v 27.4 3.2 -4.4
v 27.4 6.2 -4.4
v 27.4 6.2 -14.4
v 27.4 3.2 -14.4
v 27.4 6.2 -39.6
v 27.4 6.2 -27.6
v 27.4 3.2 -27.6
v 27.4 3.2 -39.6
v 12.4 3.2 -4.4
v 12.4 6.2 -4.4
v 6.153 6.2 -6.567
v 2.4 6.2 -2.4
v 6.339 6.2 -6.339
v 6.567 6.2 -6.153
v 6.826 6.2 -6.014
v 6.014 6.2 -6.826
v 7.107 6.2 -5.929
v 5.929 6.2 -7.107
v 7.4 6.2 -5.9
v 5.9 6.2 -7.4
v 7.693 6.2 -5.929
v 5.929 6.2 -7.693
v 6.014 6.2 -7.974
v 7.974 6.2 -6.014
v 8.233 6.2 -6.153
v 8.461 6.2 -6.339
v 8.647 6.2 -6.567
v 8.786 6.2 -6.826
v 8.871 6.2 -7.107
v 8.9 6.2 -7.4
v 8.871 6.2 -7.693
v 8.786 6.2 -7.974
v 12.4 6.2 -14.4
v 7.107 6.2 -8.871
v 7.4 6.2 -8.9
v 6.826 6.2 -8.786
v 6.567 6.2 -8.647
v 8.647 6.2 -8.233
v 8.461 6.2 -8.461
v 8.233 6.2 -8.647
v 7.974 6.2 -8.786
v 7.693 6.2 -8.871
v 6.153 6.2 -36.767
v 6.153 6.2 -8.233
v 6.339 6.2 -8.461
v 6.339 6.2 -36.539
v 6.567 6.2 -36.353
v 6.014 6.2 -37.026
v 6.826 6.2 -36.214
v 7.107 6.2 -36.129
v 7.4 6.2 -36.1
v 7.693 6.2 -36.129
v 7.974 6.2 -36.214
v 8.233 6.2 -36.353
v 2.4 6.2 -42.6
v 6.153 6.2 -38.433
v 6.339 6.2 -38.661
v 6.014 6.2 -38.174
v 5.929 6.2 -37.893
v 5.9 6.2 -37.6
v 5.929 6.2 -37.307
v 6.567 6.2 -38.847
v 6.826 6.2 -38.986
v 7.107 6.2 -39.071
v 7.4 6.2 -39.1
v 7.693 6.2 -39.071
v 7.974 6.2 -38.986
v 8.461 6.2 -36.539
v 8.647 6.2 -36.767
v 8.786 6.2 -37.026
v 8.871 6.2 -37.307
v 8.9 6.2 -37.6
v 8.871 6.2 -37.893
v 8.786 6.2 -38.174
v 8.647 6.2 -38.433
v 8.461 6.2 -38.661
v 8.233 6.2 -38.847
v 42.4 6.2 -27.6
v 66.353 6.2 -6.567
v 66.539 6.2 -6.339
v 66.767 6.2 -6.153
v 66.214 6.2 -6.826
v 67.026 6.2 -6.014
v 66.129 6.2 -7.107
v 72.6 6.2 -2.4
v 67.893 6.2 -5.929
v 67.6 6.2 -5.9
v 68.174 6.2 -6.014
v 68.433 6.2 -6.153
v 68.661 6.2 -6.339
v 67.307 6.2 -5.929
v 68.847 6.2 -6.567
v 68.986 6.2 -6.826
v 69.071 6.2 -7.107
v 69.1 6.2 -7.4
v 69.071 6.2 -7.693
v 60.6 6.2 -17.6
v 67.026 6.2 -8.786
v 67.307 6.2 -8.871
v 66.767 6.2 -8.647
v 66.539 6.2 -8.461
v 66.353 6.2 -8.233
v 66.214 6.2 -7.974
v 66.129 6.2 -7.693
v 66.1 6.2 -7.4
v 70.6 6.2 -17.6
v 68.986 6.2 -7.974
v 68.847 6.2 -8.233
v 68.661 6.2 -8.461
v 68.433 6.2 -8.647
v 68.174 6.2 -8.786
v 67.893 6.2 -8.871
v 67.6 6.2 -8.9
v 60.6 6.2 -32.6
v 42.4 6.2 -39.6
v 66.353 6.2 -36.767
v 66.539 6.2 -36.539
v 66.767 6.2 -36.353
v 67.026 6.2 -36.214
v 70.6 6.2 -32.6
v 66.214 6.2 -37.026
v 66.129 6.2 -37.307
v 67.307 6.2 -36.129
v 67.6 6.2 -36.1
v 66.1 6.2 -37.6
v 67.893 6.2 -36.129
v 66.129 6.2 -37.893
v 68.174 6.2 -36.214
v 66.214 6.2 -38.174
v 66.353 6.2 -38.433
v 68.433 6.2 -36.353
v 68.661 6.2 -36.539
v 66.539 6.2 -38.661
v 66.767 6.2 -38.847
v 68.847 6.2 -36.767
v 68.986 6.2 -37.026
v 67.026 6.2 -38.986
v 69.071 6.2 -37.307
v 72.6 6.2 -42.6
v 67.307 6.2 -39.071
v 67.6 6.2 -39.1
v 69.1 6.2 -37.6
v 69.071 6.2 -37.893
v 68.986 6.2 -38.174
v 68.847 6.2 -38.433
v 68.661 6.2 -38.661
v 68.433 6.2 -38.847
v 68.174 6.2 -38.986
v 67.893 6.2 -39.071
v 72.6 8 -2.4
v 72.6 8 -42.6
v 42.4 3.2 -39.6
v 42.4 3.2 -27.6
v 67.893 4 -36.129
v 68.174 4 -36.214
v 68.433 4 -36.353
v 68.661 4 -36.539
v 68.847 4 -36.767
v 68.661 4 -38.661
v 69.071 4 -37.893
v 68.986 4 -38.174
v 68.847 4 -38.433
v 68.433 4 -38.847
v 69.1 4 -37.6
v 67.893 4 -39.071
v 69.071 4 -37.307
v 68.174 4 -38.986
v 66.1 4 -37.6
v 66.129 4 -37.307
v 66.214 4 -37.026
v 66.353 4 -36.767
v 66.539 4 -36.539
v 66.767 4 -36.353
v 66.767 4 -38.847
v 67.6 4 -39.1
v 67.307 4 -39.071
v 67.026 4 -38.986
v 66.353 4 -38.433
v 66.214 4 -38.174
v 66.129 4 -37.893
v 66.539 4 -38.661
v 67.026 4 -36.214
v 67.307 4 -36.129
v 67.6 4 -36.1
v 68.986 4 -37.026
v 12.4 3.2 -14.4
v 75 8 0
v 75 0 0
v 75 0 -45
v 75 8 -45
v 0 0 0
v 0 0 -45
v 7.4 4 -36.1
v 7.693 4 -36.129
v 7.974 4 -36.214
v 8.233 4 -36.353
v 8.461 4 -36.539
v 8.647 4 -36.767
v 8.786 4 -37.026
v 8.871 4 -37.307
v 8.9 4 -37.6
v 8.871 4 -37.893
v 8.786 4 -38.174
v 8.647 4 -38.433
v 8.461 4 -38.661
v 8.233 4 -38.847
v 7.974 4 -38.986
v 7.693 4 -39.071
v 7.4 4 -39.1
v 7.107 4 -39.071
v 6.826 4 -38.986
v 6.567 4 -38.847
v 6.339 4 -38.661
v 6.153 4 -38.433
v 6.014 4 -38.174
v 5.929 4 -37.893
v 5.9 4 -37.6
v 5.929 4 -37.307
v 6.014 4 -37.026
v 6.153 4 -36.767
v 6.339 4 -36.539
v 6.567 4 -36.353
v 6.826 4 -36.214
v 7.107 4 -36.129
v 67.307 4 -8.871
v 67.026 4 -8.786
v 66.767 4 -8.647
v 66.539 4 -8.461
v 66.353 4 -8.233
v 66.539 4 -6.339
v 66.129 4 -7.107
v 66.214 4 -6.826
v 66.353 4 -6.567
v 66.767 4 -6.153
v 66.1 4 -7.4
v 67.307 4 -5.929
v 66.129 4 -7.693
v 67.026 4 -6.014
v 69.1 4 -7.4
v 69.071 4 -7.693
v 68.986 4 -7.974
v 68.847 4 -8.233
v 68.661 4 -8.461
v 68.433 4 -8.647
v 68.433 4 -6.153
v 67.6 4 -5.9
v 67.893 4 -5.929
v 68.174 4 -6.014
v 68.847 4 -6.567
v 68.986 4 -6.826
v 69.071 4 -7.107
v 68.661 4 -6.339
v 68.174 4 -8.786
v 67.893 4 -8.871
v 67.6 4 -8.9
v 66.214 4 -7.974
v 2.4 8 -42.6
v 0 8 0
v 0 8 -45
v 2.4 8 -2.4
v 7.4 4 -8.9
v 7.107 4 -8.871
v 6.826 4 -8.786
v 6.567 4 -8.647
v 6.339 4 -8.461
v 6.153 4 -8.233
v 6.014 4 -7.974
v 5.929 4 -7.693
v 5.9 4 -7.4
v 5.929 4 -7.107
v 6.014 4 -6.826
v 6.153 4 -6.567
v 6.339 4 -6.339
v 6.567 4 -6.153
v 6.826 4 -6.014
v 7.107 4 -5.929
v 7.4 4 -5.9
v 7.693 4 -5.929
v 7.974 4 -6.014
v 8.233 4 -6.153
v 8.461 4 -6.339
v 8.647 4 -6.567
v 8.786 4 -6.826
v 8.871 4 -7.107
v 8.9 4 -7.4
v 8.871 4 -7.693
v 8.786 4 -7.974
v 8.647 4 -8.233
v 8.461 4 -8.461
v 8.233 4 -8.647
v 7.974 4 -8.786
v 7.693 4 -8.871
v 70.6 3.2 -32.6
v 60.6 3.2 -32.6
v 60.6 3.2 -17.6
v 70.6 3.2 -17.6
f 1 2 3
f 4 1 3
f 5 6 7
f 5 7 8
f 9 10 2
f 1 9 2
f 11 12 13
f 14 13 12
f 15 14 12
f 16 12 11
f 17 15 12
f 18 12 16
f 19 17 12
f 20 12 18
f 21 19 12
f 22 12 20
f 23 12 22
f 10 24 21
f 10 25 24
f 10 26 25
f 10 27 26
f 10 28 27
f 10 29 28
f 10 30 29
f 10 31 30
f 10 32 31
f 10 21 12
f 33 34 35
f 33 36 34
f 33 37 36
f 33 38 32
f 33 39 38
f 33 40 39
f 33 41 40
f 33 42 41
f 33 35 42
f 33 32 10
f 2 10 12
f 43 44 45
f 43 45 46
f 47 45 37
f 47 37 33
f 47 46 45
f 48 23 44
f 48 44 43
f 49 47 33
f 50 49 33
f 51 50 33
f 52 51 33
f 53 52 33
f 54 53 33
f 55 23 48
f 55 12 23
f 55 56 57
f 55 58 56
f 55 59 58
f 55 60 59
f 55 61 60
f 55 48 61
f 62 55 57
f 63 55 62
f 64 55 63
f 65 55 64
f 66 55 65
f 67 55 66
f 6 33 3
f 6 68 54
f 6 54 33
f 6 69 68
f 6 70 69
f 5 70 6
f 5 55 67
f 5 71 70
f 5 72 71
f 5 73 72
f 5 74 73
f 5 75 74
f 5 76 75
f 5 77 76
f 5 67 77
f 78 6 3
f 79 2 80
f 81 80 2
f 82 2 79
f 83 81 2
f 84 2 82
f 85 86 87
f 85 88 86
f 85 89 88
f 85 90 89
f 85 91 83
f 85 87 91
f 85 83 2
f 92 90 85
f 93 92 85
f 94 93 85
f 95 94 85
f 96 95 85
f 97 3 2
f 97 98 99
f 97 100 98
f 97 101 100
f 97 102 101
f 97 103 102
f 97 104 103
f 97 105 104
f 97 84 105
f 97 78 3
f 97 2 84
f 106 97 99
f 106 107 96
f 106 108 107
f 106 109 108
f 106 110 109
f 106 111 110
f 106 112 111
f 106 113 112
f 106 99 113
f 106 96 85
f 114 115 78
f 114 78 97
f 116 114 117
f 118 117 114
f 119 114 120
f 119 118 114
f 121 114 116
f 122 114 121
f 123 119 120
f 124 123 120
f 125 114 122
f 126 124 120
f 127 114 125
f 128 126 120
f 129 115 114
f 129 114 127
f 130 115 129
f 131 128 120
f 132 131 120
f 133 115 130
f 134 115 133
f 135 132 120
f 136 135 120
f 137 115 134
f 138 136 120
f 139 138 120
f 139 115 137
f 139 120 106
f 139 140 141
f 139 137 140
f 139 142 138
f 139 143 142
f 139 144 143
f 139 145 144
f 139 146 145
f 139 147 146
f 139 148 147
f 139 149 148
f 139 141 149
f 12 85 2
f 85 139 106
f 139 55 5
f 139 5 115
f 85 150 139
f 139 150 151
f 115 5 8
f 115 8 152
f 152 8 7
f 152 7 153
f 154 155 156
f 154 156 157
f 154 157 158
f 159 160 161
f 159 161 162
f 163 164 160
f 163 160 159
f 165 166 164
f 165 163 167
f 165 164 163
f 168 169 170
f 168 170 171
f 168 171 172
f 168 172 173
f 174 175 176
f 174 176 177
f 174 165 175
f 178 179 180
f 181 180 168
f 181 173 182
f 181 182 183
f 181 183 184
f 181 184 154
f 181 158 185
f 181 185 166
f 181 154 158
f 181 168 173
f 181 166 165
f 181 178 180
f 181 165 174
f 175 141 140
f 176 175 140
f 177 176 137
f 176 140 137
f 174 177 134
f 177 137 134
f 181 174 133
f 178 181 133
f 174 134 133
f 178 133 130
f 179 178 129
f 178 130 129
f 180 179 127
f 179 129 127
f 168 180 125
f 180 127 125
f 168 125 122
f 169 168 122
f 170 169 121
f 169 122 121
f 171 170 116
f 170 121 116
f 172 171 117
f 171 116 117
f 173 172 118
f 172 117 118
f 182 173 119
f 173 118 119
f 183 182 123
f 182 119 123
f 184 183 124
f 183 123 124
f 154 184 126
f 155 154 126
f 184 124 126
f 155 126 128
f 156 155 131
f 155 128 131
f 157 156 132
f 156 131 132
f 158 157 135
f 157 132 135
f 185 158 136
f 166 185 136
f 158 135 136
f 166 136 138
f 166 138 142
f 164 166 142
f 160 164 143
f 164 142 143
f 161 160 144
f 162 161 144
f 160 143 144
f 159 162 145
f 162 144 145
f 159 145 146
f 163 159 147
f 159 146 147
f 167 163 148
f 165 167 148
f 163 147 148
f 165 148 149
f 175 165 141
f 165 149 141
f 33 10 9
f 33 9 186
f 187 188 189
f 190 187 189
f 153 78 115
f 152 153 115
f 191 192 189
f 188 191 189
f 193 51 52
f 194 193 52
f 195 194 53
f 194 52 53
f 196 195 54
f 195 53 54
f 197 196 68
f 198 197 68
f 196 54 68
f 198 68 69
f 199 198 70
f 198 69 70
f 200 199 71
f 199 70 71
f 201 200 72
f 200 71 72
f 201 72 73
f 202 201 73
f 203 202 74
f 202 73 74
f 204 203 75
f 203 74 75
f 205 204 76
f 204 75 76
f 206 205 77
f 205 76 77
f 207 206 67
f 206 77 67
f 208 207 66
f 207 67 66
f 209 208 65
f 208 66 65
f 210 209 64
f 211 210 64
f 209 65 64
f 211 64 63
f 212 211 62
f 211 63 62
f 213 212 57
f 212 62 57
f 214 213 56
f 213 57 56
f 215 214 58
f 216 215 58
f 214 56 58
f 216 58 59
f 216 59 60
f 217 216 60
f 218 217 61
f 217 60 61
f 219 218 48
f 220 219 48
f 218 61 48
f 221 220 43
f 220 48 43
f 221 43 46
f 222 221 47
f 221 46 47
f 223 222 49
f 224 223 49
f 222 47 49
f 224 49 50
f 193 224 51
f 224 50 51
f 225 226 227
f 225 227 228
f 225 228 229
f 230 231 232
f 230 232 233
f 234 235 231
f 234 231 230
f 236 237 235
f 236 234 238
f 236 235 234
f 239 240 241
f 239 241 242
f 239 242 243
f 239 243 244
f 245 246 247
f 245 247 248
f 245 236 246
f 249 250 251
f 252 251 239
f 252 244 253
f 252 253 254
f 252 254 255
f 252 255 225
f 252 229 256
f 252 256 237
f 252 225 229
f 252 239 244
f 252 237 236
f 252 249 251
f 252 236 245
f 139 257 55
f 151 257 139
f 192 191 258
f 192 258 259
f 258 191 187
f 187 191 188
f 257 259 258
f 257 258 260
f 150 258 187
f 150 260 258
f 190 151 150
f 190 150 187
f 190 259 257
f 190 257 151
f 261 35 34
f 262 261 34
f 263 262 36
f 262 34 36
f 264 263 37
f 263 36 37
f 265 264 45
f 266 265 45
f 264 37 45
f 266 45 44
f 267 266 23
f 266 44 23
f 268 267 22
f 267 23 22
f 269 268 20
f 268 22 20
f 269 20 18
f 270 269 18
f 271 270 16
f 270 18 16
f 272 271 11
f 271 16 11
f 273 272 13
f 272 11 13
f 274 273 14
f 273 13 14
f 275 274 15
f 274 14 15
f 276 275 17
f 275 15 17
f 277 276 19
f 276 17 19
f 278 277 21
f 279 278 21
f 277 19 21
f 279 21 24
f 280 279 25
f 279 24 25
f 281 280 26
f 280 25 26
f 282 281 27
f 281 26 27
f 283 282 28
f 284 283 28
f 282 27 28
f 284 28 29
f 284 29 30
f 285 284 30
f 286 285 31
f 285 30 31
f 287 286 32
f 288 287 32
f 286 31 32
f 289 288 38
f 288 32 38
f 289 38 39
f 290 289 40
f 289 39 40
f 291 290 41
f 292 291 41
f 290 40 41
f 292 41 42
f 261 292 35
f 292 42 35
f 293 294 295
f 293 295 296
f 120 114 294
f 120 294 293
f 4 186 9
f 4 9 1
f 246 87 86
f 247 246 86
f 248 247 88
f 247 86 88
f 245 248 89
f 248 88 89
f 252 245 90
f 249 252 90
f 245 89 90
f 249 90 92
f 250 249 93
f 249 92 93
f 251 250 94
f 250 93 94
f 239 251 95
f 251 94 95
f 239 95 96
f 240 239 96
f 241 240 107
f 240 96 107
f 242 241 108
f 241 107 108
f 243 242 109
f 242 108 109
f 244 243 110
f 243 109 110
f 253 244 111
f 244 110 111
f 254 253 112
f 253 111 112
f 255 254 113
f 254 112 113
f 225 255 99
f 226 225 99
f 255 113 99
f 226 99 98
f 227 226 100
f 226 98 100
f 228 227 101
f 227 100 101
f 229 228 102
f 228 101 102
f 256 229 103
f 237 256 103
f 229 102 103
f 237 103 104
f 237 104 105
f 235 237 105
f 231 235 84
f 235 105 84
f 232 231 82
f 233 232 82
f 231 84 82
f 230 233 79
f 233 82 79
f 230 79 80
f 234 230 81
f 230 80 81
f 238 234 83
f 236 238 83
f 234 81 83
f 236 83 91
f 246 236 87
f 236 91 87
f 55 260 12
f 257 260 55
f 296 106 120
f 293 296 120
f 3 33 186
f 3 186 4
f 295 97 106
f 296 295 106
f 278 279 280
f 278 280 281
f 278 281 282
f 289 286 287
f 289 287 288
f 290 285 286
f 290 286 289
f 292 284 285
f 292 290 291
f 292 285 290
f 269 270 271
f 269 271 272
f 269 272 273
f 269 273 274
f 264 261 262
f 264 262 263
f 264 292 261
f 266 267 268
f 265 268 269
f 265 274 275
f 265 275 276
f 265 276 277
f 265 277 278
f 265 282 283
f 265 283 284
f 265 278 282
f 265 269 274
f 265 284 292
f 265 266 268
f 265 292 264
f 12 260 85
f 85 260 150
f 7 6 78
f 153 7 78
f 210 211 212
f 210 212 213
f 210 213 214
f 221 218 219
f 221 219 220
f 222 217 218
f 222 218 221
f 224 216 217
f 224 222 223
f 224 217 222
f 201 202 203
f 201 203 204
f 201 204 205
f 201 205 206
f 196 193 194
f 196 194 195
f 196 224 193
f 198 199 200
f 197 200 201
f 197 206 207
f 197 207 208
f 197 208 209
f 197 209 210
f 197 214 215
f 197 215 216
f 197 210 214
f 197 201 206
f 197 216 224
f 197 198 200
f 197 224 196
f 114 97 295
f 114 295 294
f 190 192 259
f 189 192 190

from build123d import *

# Parameters (mm, degrees)
SKETCH_2_W          = 75
SKETCH_2_H          = 45
EXTRUDE_3_DEPTH     = 8
SKETCH_5_W          = 70.2
SKETCH_5_H          = 40.2
CUT_EXTRUDE_1_DEPTH = 1.8
SKETCH_7_R          = 1.5
CUT_EXTRUDE_4_DEPTH = 2.2
SKETCH_8_W          = 15
SKETCH_8_H          = 10
SKETCH_8_W_2        = 10
SKETCH_8_H_2        = 15
SKETCH_8_H_3        = 12
CUT_EXTRUDE_6_DEPTH = 3


with BuildPart() as part:
    # 草图2 → 凸台-拉伸3 (new body)
    with BuildSketch(Plane(origin=(0, 0, 0), x_dir=(1, 0, 0), z_dir=(0, 1, 0))):
        with Locations((37.5, 22.5)):
            Rectangle(SKETCH_2_W, SKETCH_2_H)
    extrude(amount=EXTRUDE_3_DEPTH)

    # 草图5 → 切除-拉伸1 (cut)
    with BuildSketch(Plane(origin=(0, 8, 0), x_dir=(1, 0, 0), z_dir=(0, 1, 0))):
        with Locations((37.5, 22.5)):
            Rectangle(SKETCH_5_W, SKETCH_5_H)
    extrude(amount=-CUT_EXTRUDE_1_DEPTH, mode=Mode.SUBTRACT)

    # 草图7 → 切除-拉伸4 (cut)
    with BuildSketch(Plane(origin=(0, 6.2, 0), x_dir=(1, 0, 0), z_dir=(0, 1, 0))):
        with Locations(Location((7.4, 37.6, 0), (0, 0, 270))):
            Circle(SKETCH_7_R)
        with Locations(Location((67.6, 37.6, 0), (0, 0, 90))):
            Circle(SKETCH_7_R)
        with Locations(Location((7.4, 7.4, 0), (0, 0, 90))):
            Circle(SKETCH_7_R)
        with Locations(Location((67.6, 7.4, 0), (0, 0, 270))):
            Circle(SKETCH_7_R)
    extrude(amount=-CUT_EXTRUDE_4_DEPTH, mode=Mode.SUBTRACT)

    # 草图8 → 切除-拉伸6 (cut)
    with BuildSketch(Plane(origin=(0, 6.2, 0), x_dir=(1, 0, 0), z_dir=(0, 1, 0))):
        with Locations((19.9, 9.4)):
            Rectangle(SKETCH_8_W, SKETCH_8_H)
        with Locations((65.6, 25.1)):
            Rectangle(SKETCH_8_W_2, SKETCH_8_H_2)
        with Locations((34.9, 33.6)):
            Rectangle(SKETCH_8_W, SKETCH_8_H_3)
    extrude(amount=-CUT_EXTRUDE_6_DEPTH, mode=Mode.SUBTRACT)


solid = part.part
